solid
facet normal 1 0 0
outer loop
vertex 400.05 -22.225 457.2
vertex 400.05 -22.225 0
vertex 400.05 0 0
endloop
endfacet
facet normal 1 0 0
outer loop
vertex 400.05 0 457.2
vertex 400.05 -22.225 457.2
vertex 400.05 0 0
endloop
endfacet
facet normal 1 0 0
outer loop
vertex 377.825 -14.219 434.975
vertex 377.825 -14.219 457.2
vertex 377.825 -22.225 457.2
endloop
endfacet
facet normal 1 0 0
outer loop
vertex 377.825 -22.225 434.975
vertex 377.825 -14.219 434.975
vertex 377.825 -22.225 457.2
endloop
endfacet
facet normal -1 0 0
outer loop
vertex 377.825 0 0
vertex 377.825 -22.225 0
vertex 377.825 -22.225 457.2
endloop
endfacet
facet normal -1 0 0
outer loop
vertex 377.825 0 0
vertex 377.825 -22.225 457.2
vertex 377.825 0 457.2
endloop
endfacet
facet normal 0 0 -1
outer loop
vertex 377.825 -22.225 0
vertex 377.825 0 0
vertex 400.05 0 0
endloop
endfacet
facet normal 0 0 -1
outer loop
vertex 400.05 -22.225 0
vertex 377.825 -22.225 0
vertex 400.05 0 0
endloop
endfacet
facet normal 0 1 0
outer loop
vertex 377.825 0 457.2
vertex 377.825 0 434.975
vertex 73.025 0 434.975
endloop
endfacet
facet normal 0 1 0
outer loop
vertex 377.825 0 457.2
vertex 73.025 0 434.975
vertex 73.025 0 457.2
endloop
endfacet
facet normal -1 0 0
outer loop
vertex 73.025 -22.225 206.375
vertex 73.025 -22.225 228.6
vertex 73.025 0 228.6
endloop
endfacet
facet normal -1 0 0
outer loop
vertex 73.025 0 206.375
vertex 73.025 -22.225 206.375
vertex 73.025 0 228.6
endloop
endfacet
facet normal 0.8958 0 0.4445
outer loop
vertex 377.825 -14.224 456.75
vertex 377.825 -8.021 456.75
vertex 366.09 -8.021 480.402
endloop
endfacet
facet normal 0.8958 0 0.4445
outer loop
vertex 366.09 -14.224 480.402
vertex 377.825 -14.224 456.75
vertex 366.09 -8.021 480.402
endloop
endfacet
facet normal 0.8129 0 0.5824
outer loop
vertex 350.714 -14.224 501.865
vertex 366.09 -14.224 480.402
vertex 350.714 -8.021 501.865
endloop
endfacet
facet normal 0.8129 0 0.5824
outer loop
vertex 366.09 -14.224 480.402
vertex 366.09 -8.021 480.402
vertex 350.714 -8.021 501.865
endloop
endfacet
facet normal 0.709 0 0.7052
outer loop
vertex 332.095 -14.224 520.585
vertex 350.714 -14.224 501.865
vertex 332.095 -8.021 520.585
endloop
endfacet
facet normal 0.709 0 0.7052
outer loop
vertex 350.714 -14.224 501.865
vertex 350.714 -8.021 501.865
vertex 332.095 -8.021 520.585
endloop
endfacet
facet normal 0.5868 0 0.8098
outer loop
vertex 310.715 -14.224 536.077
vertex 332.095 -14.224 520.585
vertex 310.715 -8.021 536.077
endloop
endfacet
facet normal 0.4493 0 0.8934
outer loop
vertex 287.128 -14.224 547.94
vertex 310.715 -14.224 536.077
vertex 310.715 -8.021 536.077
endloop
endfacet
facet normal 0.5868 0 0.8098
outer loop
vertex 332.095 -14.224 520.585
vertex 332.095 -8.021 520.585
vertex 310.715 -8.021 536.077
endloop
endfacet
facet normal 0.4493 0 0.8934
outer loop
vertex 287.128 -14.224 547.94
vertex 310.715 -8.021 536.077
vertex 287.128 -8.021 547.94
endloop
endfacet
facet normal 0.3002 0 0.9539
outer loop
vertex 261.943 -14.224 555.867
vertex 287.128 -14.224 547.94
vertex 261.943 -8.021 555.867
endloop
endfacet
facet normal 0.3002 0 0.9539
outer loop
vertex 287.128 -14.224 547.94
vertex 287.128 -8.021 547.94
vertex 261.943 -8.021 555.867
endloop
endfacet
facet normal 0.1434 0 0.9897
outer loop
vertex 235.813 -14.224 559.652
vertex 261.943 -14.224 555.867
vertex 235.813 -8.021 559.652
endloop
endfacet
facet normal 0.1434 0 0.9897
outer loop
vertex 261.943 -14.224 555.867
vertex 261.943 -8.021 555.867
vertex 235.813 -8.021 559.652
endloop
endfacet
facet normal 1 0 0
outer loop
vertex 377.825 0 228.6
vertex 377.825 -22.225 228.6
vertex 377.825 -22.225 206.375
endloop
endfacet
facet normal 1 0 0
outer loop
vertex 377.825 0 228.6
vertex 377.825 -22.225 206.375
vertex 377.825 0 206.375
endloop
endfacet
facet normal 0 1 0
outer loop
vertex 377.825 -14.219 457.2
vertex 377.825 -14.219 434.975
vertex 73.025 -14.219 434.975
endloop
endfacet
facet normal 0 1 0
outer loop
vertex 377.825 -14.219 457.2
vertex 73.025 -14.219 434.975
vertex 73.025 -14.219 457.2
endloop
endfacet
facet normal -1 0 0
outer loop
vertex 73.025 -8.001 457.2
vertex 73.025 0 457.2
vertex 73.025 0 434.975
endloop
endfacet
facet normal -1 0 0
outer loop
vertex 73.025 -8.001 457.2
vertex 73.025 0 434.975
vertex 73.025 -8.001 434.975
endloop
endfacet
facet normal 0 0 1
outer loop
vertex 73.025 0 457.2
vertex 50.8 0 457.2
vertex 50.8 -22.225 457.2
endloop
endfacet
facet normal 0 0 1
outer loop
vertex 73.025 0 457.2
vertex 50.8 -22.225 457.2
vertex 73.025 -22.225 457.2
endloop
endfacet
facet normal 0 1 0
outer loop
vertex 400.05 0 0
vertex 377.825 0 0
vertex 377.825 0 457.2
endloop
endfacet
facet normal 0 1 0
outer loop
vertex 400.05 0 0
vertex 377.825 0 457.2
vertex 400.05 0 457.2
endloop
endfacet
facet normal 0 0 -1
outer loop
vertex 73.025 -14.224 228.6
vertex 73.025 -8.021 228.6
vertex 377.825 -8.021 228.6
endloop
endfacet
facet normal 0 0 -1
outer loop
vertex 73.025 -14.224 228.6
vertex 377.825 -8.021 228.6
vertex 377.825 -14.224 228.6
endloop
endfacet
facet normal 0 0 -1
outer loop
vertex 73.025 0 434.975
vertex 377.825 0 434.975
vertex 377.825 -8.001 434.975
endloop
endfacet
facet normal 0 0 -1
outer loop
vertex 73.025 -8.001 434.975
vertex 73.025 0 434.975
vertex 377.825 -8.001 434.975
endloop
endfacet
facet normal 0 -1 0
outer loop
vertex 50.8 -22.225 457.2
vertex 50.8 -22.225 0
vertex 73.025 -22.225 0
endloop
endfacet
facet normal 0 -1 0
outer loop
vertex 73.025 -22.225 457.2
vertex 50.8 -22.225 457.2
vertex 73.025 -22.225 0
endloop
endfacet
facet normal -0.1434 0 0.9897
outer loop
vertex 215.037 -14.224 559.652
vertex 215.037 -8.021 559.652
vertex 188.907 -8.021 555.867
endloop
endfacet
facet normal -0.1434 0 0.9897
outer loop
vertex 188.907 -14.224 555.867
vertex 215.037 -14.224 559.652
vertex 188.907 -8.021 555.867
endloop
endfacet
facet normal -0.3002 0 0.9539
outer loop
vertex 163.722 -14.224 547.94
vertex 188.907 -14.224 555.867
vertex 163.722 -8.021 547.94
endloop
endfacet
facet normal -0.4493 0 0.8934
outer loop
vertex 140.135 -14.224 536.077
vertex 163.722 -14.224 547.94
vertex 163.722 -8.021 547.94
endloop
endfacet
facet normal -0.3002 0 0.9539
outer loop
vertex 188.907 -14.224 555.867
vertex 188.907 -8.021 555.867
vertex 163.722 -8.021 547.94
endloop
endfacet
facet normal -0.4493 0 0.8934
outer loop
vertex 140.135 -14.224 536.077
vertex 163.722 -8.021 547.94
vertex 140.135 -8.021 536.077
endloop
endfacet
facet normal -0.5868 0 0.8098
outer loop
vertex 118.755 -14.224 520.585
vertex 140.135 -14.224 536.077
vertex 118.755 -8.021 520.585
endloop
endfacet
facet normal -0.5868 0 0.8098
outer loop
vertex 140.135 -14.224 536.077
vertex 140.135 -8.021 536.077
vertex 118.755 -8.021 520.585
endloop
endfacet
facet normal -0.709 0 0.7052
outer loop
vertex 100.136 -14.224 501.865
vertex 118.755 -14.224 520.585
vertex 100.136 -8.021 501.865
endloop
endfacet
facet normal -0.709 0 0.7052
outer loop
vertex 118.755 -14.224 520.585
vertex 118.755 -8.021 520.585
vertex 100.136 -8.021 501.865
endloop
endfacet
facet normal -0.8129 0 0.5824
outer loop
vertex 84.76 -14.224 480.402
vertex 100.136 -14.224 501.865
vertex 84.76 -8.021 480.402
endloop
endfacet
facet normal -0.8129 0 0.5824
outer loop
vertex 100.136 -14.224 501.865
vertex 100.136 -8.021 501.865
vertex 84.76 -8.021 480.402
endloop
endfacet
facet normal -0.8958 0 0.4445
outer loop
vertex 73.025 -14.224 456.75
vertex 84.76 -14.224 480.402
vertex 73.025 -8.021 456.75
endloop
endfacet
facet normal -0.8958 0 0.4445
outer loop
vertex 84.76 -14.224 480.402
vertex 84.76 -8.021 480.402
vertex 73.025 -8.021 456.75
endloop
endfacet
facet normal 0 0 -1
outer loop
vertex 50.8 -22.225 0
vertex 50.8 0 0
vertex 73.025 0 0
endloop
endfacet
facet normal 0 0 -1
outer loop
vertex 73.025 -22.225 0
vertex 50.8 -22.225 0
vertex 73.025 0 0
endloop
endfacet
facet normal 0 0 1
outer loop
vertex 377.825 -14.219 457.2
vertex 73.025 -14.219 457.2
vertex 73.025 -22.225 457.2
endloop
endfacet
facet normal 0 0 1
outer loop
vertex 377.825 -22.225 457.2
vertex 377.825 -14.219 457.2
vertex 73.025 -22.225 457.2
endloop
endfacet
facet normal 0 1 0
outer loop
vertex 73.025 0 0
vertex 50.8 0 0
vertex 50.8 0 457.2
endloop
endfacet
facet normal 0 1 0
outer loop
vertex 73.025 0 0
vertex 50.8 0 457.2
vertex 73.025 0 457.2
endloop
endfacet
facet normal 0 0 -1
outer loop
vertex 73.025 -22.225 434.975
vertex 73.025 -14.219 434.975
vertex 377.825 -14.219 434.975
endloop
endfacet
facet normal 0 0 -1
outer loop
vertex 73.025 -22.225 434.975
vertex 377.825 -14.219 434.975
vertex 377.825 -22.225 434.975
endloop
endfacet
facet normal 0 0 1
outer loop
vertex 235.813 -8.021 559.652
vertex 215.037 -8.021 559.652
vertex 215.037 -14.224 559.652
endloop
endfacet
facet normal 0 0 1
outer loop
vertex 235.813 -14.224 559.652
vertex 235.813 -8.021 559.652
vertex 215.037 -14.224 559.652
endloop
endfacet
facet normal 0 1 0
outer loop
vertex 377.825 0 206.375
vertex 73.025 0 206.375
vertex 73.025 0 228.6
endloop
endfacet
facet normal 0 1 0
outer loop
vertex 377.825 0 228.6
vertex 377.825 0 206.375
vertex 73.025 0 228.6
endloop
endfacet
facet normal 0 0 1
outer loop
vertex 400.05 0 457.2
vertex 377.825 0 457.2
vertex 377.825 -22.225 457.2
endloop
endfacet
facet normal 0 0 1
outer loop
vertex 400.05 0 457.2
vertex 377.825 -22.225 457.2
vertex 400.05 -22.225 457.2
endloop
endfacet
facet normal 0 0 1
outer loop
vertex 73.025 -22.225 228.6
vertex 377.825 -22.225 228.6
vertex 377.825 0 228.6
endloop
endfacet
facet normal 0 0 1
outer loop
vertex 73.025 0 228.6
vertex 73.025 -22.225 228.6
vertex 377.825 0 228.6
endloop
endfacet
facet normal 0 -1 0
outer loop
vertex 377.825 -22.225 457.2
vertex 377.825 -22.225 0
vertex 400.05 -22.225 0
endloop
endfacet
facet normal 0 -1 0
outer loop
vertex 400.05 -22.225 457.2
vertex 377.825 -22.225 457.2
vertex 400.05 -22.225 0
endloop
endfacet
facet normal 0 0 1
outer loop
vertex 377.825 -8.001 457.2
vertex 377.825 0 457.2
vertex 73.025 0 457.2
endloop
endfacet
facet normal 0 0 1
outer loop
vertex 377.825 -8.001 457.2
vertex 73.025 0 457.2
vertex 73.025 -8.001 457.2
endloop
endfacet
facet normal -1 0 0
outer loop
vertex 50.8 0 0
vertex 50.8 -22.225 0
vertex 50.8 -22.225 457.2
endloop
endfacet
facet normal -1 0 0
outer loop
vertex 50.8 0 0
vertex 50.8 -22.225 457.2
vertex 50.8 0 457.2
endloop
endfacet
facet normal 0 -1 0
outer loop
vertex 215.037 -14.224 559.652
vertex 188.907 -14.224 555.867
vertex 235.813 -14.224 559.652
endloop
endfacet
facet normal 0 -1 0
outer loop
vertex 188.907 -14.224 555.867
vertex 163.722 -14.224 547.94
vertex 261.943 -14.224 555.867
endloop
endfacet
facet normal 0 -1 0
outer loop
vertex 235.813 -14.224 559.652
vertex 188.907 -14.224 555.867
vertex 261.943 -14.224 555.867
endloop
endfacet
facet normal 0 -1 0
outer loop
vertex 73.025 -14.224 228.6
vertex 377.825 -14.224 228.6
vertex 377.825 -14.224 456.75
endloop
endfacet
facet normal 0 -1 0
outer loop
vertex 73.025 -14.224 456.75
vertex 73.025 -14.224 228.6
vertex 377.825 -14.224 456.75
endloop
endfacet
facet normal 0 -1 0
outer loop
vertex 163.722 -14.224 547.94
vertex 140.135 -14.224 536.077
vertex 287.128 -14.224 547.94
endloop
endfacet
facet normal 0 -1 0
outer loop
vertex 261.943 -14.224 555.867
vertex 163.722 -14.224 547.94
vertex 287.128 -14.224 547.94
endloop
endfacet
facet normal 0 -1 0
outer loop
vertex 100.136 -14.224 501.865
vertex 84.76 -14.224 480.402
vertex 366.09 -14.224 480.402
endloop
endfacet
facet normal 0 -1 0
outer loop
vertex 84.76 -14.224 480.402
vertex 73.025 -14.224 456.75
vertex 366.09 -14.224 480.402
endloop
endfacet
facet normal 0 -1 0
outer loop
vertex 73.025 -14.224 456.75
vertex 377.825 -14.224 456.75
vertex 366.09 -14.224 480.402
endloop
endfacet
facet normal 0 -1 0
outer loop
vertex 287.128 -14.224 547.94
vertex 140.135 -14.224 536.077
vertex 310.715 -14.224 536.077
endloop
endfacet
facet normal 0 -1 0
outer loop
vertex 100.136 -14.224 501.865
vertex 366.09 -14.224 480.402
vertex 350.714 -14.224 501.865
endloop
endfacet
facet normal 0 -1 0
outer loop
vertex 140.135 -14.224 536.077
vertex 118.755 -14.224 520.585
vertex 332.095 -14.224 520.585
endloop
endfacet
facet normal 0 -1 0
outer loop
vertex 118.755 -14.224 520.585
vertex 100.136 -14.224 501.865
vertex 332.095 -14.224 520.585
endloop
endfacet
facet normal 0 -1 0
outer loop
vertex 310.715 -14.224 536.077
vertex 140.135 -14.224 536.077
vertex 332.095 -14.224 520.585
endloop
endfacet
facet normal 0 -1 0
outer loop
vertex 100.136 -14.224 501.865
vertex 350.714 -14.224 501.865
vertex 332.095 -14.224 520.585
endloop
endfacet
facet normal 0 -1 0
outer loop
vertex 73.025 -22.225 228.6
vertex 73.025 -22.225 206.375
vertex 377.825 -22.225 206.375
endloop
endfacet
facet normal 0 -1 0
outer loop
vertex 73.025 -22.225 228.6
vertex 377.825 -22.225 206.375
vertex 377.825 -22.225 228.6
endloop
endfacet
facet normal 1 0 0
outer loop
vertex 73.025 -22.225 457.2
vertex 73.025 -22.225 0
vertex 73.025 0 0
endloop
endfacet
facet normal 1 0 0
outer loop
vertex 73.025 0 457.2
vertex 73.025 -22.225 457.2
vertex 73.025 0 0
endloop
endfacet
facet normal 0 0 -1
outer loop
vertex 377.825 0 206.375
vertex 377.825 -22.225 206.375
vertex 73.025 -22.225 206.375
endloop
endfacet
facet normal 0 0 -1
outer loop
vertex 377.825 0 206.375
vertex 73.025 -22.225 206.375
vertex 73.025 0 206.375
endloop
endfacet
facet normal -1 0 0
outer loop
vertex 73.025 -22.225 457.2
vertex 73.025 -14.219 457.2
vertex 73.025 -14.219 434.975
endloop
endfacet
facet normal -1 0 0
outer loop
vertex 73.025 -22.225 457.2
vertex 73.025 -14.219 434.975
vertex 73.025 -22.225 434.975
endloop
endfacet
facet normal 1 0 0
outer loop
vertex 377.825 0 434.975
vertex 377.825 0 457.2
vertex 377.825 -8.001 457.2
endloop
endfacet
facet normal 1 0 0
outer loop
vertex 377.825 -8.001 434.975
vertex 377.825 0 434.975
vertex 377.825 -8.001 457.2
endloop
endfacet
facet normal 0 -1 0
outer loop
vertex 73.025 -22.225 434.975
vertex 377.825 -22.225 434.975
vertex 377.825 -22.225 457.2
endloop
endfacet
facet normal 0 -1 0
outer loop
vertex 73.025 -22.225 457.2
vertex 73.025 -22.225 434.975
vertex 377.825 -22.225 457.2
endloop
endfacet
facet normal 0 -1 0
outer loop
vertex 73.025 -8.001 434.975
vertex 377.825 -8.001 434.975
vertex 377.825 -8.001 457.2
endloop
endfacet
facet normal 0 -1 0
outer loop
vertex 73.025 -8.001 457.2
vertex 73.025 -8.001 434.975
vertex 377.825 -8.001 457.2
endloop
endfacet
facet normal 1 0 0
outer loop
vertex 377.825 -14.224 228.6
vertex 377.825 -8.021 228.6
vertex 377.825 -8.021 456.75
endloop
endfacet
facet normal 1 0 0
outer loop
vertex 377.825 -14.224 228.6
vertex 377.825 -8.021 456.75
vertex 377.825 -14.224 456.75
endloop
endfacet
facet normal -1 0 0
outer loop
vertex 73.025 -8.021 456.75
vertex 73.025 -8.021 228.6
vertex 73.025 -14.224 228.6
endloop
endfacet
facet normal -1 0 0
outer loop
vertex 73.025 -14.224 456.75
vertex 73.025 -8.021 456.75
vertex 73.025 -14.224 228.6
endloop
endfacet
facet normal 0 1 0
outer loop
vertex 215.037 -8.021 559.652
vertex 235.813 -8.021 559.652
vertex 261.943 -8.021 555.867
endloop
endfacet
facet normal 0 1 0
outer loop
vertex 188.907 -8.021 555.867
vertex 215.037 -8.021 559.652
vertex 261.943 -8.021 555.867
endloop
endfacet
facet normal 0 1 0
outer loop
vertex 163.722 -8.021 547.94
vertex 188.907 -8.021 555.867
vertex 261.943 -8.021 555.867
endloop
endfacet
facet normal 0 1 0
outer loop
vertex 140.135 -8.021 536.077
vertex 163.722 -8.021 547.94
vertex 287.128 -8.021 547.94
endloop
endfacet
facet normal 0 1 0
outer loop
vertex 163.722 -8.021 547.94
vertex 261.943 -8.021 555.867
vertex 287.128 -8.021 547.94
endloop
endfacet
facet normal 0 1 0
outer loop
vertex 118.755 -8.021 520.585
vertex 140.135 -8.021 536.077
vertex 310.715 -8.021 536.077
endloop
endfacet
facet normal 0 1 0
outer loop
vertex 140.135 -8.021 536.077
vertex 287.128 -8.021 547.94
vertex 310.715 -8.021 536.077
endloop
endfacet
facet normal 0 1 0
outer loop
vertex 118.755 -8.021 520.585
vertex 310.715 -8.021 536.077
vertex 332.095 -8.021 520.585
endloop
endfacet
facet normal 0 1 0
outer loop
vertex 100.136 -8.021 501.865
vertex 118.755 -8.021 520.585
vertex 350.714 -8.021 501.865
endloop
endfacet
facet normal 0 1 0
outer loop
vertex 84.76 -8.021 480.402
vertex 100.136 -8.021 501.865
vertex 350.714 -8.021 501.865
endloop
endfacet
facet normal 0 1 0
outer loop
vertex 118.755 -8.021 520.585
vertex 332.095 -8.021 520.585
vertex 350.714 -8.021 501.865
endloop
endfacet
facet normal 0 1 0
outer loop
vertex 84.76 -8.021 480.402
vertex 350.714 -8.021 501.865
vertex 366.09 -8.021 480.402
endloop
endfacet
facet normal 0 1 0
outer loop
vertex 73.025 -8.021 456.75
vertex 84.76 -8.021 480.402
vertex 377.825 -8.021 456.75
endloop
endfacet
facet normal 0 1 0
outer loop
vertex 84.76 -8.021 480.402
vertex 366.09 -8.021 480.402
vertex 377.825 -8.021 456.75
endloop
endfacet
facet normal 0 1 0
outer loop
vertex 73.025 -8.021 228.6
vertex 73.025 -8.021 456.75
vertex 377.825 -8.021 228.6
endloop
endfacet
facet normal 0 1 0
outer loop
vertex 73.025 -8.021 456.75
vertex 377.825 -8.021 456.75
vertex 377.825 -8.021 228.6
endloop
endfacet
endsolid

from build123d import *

# Parameters (mm, degrees)
F0_W     = 22.225
F0_H     = 22.225
F1_DEPTH = 457.2
F2_W     = 22.225
F2_H     = 22.225
F3_DEPTH = 304.8
F4_W     = 6.2032067217
F4_H     = 102.4522092819
F4_H_2   = 228.6
F5_DEPTH = 304.8
F7_DEPTH = 6.2032067217
F8_W     = 8.0055892825
F8_H     = 22.225
F9_DEPTH = 304.8
F8_W_2   = 8.001


with BuildPart() as f1:
    # F0 (on Top) → F1 (new body)
    with BuildSketch(Plane.XY):
        with Locations((61.9125, -11.1125)):
            Rectangle(F0_W, F0_H)
    extrude(amount=F1_DEPTH)


with BuildPart() as f1b:
    # F0 (on Top) → F1, piece 2 (new body)
    with BuildSketch(Plane.XY):
        with Locations((388.9375, -11.1125)):
            Rectangle(F0_W, F0_H)
    extrude(amount=F1_DEPTH)


with BuildPart() as f3:
    # F2 (on face) → F3 (new body, through all)
    with BuildSketch(Plane.YZ.offset(73.025)):
        with Locations((-11.1125, 217.4875)):
            Rectangle(F2_W, F2_H)
    extrude(amount=F3_DEPTH)


with BuildPart() as f5:
    # F4 (on face) → F5 (new body)
    with BuildSketch(Plane(origin=(377.825, 0, 0), x_dir=(0, -1, 0), z_dir=(-1, 0, 0))):
        with Locations((11.1223966392, 508.426104641)):
            Rectangle(F4_W, F4_H)
        with Locations((11.1223966392, 342.9)):
            Rectangle(F4_W, F4_H_2)
    extrude(amount=F5_DEPTH)

    # F6 (on face) → F7 (cut, through all)
    with BuildSketch(Plane(origin=(0, -8.0207932783, 0), x_dir=(-1, 0, 0), z_dir=(0, 1, 0))):
        with BuildLine():
            ThreePointArc((-377.825, 456.7500650883), (-321.7172124143, 528.7617500692), (-235.8129277064, 559.6522092819))
            Line((-235.8129277064, 559.6522092819), (-377.825, 559.6522092819))
            Line((-377.825, 559.6522092819), (-377.825, 456.7500650883))
        make_face()
        with BuildLine():
            ThreePointArc((-215.0370722936, 559.6522092819), (-129.1327875857, 528.7617500692), (-73.025, 456.7500650883))
            Line((-73.025, 456.7500650883), (-73.025, 559.6522092819))
            Line((-73.025, 559.6522092819), (-215.0370722936, 559.6522092819))
        make_face()
    extrude(amount=-F7_DEPTH, mode=Mode.SUBTRACT)


with BuildPart() as f9:
    # F8 (on face) → F9 (new body, through all)
    with BuildSketch(Plane(origin=(377.825, 0, 0), x_dir=(0, -1, 0), z_dir=(-1, 0, 0))):
        with Locations((18.2222053587, 446.0875)):
            Rectangle(F8_W, F8_H)
    extrude(amount=F9_DEPTH)


with BuildPart() as f9b:
    # F8 (on face) → F9, piece 2 (new body, through all)
    with BuildSketch(Plane(origin=(377.825, 0, 0), x_dir=(0, -1, 0), z_dir=(-1, 0, 0))):
        with Locations((4.0005, 446.0875)):
            Rectangle(F8_W_2, F8_H)
    extrude(amount=F9_DEPTH)


solid = Compound([f1.part, f1b.part, f3.part, f5.part, f9.part, f9b.part])
